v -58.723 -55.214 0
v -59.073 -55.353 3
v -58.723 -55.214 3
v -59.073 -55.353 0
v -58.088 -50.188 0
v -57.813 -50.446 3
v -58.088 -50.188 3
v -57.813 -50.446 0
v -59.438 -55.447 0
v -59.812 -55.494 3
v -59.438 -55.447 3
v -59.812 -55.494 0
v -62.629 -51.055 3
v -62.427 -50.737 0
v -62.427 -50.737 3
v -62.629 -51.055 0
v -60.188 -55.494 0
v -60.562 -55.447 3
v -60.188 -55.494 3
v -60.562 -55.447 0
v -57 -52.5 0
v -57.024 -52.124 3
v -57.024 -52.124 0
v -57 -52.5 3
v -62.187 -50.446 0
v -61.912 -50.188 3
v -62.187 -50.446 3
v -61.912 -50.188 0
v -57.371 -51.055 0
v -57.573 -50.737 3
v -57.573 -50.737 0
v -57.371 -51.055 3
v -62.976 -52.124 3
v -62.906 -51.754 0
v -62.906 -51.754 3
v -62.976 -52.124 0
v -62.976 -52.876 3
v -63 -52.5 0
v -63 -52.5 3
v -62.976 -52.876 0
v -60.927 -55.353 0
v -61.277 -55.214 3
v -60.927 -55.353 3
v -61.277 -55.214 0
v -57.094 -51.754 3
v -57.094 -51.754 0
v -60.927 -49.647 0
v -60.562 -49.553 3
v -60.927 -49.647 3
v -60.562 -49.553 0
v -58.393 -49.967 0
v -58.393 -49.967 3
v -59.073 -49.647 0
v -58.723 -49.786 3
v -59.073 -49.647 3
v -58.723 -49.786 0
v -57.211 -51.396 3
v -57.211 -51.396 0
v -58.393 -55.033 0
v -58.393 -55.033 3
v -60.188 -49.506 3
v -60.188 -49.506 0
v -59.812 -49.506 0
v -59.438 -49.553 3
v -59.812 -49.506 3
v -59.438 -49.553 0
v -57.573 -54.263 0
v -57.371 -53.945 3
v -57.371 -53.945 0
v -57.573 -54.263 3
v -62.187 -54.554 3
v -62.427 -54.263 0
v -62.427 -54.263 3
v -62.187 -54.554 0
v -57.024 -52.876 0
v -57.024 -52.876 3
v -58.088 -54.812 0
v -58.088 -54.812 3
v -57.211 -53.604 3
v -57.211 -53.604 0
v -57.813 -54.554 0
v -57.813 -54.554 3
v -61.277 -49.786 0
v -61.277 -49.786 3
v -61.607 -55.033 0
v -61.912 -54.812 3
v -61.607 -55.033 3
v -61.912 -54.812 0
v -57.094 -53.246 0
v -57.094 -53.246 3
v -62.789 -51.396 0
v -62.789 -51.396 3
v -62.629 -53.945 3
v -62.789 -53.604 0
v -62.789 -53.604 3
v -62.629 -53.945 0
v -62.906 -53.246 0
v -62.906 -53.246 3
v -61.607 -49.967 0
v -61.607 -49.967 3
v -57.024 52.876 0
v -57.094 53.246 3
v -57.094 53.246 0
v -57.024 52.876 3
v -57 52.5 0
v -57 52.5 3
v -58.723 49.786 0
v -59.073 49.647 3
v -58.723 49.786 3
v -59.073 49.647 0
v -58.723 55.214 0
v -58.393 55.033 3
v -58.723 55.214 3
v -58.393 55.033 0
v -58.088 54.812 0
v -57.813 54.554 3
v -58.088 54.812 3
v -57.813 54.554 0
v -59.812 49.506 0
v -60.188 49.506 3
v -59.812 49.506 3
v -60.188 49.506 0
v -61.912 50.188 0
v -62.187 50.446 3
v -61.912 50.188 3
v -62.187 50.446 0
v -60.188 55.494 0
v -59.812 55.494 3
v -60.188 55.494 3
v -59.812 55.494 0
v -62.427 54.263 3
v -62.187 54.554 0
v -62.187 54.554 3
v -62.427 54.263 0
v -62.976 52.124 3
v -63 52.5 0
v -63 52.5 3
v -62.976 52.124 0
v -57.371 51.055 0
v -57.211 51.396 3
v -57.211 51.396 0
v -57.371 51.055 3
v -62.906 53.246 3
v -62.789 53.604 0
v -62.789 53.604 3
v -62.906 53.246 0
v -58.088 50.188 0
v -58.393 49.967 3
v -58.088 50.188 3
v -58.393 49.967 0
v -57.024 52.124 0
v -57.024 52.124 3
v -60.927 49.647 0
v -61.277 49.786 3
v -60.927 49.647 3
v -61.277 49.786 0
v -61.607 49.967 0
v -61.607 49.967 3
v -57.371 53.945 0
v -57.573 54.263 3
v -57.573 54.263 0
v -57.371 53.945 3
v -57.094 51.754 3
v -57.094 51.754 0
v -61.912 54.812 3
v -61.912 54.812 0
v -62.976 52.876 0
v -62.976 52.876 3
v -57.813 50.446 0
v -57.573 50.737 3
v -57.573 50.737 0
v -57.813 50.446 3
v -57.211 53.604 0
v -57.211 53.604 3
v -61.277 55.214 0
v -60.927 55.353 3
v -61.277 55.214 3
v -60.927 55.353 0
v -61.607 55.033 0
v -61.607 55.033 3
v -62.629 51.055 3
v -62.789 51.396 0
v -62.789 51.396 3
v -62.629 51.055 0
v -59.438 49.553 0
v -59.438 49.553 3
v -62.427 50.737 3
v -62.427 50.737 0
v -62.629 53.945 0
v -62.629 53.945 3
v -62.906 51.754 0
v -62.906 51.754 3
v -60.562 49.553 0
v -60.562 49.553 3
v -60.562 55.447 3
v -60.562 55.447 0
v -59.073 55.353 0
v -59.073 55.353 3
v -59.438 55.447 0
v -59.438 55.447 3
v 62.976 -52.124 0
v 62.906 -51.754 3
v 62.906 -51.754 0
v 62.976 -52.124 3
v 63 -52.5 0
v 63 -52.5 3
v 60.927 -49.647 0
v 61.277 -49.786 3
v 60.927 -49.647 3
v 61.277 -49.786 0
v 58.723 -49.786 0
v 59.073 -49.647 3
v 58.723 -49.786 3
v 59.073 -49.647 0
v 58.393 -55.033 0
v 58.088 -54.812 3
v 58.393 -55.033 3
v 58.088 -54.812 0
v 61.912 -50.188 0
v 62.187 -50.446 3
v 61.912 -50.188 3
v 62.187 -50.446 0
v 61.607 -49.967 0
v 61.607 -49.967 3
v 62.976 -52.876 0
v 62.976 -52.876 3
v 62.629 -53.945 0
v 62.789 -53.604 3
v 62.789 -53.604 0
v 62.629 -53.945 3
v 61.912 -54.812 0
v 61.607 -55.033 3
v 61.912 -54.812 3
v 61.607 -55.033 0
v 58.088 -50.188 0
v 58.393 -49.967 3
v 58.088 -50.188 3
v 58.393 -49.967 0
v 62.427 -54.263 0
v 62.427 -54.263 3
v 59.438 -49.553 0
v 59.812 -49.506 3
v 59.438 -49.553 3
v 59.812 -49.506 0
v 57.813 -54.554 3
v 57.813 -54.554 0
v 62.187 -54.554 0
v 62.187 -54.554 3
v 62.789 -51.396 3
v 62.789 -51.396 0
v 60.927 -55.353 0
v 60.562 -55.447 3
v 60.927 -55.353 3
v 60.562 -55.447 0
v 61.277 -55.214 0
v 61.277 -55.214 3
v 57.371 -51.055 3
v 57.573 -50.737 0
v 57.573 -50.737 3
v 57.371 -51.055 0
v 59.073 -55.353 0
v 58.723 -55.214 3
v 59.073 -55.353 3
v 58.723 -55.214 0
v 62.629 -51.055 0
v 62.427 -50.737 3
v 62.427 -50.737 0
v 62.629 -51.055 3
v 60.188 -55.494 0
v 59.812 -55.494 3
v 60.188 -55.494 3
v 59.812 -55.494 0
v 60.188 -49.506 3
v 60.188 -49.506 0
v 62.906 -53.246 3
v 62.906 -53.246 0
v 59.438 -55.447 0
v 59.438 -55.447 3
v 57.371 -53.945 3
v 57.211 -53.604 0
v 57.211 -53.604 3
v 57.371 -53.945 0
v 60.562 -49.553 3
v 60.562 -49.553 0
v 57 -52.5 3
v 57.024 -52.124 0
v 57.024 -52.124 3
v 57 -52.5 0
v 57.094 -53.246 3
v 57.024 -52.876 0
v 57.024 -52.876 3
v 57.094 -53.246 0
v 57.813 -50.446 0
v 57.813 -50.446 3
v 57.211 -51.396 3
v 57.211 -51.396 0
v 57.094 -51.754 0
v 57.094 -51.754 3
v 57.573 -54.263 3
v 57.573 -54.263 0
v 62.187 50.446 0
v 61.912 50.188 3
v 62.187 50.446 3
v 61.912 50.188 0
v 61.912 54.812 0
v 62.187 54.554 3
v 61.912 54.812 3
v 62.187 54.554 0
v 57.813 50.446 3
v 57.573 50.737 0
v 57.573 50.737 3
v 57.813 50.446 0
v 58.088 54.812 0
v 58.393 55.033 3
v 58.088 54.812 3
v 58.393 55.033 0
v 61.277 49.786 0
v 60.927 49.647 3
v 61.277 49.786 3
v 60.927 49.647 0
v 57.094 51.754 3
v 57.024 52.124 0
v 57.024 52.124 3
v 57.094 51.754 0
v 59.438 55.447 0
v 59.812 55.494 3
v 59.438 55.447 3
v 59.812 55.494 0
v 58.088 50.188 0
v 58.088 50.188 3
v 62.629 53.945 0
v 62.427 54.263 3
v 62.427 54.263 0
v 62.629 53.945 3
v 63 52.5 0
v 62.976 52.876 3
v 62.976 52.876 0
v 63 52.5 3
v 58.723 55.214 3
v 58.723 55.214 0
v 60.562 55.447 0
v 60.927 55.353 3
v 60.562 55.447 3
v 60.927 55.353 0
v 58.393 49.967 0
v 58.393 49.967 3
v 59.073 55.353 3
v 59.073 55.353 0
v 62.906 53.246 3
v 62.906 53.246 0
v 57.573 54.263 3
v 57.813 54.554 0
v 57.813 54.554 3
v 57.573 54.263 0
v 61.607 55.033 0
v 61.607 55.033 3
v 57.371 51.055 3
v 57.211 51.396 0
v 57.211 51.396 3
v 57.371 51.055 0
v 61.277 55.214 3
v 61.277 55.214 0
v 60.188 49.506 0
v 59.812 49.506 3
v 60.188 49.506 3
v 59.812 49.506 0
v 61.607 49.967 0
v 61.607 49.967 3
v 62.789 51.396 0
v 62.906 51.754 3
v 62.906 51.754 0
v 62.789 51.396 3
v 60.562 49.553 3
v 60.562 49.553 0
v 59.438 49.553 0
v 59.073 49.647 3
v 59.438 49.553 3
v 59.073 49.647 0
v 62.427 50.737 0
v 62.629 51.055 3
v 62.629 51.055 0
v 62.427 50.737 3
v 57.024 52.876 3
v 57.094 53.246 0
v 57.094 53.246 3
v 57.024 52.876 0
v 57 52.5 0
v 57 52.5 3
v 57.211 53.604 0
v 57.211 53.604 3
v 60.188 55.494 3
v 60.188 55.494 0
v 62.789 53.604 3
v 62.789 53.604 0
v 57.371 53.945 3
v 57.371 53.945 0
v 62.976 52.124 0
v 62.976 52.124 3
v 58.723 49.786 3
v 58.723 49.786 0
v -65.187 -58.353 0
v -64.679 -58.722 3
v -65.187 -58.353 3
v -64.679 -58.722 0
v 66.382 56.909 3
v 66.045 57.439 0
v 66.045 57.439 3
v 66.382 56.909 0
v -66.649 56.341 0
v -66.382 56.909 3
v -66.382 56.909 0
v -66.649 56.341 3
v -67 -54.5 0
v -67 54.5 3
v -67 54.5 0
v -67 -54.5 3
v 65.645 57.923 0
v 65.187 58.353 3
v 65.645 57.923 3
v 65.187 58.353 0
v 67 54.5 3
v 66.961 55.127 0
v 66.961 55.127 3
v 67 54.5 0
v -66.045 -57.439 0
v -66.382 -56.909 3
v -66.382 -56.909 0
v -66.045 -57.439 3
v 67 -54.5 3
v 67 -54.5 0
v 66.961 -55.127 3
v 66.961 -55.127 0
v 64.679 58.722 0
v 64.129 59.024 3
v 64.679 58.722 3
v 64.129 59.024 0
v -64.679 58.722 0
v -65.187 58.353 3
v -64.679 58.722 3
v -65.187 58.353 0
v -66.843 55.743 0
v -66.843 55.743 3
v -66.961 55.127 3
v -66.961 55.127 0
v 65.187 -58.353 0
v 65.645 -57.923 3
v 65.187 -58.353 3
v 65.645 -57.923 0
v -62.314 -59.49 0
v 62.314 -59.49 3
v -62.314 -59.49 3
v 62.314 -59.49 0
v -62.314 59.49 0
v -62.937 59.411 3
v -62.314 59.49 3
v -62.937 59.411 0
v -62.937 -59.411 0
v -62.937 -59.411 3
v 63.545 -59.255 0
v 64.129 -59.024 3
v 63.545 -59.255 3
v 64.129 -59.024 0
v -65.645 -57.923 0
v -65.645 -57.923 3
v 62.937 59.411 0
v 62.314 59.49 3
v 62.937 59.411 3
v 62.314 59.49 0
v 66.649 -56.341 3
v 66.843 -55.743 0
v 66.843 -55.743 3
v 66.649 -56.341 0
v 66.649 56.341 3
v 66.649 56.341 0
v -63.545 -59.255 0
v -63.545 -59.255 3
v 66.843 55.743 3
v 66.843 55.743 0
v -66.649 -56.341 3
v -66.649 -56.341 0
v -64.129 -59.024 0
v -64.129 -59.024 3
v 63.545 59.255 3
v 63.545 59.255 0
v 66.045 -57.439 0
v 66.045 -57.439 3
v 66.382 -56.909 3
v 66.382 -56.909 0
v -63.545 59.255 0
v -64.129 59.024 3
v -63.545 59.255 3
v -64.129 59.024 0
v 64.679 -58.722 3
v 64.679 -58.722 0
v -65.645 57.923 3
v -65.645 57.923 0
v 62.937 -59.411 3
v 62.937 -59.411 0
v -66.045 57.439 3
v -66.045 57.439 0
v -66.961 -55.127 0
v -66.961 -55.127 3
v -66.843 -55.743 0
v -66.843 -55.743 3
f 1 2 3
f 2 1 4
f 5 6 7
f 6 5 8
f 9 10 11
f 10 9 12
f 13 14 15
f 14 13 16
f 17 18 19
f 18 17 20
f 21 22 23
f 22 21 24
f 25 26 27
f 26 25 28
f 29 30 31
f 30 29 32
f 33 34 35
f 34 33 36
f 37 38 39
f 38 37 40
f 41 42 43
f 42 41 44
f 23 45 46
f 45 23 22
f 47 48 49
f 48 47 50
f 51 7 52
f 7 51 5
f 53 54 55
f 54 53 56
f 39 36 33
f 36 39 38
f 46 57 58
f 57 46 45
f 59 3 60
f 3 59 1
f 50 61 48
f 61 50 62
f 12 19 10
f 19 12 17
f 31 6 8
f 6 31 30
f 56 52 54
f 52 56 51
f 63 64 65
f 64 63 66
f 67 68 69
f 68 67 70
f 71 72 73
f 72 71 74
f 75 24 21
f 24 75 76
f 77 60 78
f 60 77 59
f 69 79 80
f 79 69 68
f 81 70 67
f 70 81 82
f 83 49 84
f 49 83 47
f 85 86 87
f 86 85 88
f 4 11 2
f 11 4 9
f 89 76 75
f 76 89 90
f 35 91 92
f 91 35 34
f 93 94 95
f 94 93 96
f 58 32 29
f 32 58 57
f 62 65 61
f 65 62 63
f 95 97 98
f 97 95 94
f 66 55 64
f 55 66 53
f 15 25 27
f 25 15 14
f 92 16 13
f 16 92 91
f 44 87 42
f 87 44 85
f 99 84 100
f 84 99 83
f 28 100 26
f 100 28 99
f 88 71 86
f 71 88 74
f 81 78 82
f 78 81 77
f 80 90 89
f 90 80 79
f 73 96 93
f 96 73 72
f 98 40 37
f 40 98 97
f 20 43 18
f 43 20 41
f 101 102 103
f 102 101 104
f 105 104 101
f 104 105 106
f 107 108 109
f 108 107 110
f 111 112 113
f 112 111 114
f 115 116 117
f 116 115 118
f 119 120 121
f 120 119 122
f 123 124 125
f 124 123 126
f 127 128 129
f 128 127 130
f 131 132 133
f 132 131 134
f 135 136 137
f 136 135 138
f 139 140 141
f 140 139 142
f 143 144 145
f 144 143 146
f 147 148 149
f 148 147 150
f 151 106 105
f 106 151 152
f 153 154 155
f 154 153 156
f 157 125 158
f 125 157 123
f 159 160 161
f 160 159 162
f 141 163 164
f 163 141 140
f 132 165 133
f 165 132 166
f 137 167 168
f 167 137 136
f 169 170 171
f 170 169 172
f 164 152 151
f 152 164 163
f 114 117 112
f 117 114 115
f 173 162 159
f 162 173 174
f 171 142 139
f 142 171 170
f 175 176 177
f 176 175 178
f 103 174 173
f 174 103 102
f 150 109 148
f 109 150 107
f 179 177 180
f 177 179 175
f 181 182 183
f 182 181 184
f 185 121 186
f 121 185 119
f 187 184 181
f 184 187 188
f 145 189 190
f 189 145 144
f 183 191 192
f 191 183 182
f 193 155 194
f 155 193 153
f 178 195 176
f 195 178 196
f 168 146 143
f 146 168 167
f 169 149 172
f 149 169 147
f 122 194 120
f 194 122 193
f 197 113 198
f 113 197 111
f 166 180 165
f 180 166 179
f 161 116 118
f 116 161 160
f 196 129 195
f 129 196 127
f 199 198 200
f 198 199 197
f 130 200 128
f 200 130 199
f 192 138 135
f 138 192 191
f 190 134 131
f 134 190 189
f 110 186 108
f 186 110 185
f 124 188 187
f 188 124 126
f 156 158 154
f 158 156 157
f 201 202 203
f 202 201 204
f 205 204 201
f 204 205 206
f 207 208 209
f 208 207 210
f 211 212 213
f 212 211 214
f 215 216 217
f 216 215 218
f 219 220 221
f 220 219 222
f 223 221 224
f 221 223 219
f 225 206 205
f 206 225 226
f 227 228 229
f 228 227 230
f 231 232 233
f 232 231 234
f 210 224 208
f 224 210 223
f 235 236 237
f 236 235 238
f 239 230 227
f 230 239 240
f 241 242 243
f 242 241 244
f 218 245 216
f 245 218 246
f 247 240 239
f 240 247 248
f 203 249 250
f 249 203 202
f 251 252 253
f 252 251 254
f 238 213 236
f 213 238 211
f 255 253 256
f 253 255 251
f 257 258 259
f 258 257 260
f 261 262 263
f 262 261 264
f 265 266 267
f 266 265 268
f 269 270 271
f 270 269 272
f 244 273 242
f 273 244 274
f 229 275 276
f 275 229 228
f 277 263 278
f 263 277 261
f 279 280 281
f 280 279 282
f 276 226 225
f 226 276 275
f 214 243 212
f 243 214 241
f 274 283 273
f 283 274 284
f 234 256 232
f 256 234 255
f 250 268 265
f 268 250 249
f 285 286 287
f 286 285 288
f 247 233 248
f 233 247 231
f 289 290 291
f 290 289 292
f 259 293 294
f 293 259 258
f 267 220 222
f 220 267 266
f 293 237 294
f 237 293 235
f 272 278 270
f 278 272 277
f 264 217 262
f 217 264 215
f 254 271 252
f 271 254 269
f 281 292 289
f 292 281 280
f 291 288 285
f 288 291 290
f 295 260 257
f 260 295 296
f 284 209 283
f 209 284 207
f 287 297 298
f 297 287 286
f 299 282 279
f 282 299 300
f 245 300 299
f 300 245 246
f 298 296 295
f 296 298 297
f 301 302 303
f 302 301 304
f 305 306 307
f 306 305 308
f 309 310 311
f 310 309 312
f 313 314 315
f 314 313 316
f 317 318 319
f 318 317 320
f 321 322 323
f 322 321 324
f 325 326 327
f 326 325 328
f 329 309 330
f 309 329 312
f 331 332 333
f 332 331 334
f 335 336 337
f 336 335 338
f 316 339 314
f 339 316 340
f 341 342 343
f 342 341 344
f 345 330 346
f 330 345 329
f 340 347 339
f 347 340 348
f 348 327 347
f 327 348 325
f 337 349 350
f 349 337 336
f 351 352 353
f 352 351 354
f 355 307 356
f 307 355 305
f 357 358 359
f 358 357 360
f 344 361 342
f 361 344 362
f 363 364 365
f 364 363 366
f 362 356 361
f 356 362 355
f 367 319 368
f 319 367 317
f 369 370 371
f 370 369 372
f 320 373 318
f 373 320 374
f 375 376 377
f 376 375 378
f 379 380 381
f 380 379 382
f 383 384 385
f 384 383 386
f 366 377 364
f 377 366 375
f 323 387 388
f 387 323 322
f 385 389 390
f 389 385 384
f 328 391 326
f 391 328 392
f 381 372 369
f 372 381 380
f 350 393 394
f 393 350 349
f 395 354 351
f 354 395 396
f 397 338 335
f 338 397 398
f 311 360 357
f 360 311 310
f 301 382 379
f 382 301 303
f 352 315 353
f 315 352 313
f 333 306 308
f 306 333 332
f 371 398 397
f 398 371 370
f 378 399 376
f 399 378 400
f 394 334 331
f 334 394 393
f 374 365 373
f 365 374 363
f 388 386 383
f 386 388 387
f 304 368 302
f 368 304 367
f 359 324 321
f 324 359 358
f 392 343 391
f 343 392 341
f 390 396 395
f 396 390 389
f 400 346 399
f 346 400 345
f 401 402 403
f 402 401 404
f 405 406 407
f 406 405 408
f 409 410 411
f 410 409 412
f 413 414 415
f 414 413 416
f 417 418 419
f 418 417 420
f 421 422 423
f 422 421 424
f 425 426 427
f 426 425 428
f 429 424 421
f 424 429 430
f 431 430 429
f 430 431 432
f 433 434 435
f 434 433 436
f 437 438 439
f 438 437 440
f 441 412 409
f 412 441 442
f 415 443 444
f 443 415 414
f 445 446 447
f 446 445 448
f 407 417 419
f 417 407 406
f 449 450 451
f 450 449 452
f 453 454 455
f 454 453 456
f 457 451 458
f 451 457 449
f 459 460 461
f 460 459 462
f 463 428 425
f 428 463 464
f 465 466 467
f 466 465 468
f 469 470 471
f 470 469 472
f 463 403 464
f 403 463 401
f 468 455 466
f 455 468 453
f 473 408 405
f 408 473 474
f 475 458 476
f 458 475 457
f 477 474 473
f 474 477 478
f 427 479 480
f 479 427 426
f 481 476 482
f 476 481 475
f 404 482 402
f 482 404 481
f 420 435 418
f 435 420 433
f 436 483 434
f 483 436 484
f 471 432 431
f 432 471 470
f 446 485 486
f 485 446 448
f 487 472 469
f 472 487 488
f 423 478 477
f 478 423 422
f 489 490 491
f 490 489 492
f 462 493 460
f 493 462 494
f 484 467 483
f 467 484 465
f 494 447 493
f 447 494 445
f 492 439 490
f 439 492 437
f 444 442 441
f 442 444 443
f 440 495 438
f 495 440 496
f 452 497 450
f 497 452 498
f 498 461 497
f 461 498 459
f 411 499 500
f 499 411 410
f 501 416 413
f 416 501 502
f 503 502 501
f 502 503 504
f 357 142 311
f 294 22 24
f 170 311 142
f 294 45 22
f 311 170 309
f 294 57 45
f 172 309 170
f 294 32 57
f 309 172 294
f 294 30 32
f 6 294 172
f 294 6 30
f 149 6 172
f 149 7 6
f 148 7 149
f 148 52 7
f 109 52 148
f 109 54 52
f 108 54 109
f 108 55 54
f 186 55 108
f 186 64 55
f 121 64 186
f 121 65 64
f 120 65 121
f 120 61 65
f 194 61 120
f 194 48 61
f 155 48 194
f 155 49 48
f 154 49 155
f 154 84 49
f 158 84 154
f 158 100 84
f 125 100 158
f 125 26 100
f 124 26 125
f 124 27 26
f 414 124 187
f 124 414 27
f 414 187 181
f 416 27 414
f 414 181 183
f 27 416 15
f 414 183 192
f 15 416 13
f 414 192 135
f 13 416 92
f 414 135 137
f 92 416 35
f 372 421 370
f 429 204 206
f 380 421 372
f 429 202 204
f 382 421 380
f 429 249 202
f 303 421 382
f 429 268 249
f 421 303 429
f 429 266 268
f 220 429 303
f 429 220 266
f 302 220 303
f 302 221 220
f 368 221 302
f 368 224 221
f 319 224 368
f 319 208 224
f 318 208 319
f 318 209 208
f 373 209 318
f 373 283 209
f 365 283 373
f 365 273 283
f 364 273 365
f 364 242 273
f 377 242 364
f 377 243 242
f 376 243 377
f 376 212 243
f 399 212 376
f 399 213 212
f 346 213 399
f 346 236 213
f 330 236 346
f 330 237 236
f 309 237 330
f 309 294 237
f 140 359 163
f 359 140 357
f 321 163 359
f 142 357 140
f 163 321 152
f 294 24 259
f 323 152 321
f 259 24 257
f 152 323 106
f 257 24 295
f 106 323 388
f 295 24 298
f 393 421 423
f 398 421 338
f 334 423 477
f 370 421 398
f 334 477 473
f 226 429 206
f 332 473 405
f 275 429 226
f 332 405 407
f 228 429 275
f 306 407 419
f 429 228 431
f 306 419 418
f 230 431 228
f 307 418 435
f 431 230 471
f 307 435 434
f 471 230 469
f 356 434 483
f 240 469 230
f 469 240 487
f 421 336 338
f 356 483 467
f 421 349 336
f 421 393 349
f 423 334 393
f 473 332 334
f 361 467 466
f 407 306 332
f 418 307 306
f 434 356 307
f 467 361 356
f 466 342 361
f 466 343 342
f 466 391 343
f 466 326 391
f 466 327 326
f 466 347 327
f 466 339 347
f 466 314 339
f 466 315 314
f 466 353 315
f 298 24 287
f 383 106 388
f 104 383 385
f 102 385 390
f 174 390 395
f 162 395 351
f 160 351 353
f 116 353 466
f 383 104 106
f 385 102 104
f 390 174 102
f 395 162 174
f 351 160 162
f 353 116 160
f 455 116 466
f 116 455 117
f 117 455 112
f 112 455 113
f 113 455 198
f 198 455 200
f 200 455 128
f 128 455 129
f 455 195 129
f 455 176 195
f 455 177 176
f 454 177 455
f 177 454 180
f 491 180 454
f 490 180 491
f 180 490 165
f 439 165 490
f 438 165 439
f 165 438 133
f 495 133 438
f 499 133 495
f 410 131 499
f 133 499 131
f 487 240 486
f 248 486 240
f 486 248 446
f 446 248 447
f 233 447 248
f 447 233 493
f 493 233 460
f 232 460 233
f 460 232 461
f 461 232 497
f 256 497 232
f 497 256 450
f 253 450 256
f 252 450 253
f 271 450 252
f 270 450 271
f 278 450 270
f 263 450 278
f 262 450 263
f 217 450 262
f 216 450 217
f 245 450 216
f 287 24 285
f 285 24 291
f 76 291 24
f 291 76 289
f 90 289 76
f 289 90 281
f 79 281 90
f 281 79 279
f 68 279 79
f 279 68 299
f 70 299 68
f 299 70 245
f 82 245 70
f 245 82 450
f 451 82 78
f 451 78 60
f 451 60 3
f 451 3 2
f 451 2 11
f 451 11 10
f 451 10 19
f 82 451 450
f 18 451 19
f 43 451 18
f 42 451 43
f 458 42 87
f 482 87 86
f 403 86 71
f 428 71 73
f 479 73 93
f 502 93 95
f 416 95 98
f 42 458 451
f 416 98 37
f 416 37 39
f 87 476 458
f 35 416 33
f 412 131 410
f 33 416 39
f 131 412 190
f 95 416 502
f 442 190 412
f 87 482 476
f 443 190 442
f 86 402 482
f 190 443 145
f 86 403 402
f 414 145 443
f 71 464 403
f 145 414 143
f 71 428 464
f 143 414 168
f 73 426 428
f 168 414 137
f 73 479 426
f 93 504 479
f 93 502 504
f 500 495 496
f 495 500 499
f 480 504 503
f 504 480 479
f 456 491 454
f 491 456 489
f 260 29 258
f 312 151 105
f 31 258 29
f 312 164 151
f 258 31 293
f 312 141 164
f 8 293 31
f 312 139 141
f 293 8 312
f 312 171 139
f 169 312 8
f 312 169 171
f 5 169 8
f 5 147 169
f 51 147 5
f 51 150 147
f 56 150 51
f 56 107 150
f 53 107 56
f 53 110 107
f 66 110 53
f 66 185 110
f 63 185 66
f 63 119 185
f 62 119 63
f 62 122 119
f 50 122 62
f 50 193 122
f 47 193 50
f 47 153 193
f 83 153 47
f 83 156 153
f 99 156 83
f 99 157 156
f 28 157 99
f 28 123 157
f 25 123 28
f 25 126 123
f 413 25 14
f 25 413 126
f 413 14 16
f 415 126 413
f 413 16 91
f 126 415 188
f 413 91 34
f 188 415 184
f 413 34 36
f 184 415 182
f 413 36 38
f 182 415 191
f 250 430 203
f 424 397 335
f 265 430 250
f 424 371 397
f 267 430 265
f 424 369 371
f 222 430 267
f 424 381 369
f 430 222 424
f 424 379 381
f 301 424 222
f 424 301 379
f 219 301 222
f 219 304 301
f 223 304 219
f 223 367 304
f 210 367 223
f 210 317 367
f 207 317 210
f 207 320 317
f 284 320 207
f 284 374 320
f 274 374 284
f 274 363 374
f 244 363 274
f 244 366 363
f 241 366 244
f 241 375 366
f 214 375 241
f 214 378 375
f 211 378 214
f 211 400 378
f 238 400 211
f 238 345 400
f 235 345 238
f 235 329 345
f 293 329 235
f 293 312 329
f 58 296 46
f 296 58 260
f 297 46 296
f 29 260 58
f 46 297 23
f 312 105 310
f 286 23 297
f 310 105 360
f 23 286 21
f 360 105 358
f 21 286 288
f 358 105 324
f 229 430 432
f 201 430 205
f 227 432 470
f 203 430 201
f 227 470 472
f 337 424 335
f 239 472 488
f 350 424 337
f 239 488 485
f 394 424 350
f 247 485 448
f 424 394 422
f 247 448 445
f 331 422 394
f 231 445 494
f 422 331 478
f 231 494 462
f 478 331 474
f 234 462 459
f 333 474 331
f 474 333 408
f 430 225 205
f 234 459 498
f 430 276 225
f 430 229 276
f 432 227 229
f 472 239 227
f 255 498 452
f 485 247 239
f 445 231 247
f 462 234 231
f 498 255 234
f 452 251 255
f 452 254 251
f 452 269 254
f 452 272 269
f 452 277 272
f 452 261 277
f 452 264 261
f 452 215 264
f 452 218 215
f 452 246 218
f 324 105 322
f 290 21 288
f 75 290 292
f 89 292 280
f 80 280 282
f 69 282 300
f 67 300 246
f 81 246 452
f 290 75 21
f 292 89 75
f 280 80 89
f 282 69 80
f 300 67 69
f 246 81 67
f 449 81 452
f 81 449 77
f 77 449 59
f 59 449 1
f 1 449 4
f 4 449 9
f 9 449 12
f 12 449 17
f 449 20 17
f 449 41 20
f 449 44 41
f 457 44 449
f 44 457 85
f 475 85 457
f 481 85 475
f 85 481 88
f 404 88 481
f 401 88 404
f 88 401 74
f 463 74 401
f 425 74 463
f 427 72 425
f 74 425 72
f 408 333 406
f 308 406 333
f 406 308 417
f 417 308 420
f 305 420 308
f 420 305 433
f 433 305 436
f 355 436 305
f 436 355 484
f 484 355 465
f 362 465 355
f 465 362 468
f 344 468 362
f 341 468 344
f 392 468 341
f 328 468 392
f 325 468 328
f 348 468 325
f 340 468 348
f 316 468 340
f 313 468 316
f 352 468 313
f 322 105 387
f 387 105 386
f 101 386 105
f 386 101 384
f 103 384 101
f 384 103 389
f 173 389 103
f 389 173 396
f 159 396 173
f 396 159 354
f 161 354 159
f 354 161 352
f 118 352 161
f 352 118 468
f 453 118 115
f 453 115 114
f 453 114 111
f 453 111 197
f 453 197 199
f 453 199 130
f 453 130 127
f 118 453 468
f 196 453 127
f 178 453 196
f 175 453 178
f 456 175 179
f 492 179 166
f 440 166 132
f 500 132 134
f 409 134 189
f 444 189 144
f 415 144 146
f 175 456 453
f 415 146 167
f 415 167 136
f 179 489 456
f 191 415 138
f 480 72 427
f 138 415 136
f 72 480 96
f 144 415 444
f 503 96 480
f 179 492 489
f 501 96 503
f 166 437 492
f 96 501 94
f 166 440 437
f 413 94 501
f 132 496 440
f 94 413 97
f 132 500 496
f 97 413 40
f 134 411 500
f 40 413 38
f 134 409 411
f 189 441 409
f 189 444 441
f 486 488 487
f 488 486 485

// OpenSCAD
$fn = 50;


difference() {
	union() {
		hull() {
			translate(v = [-62.0000000000, 54.5000000000, 0]) {
				cylinder(h = 3, r = 5);
			}
			translate(v = [62.0000000000, 54.5000000000, 0]) {
				cylinder(h = 3, r = 5);
			}
			translate(v = [-62.0000000000, -54.5000000000, 0]) {
				cylinder(h = 3, r = 5);
			}
			translate(v = [62.0000000000, -54.5000000000, 0]) {
				cylinder(h = 3, r = 5);
			}
		}
	}
	union() {
		translate(v = [-60.0000000000, -52.5000000000, -100.0000000000]) {
			cylinder(h = 200, r = 3.0000000000);
		}
		translate(v = [-60.0000000000, 52.5000000000, -100.0000000000]) {
			cylinder(h = 200, r = 3.0000000000);
		}
		translate(v = [60.0000000000, -52.5000000000, -100.0000000000]) {
			cylinder(h = 200, r = 3.0000000000);
		}
		translate(v = [60.0000000000, 52.5000000000, -100.0000000000]) {
			cylinder(h = 200, r = 3.0000000000);
		}
	}
}
